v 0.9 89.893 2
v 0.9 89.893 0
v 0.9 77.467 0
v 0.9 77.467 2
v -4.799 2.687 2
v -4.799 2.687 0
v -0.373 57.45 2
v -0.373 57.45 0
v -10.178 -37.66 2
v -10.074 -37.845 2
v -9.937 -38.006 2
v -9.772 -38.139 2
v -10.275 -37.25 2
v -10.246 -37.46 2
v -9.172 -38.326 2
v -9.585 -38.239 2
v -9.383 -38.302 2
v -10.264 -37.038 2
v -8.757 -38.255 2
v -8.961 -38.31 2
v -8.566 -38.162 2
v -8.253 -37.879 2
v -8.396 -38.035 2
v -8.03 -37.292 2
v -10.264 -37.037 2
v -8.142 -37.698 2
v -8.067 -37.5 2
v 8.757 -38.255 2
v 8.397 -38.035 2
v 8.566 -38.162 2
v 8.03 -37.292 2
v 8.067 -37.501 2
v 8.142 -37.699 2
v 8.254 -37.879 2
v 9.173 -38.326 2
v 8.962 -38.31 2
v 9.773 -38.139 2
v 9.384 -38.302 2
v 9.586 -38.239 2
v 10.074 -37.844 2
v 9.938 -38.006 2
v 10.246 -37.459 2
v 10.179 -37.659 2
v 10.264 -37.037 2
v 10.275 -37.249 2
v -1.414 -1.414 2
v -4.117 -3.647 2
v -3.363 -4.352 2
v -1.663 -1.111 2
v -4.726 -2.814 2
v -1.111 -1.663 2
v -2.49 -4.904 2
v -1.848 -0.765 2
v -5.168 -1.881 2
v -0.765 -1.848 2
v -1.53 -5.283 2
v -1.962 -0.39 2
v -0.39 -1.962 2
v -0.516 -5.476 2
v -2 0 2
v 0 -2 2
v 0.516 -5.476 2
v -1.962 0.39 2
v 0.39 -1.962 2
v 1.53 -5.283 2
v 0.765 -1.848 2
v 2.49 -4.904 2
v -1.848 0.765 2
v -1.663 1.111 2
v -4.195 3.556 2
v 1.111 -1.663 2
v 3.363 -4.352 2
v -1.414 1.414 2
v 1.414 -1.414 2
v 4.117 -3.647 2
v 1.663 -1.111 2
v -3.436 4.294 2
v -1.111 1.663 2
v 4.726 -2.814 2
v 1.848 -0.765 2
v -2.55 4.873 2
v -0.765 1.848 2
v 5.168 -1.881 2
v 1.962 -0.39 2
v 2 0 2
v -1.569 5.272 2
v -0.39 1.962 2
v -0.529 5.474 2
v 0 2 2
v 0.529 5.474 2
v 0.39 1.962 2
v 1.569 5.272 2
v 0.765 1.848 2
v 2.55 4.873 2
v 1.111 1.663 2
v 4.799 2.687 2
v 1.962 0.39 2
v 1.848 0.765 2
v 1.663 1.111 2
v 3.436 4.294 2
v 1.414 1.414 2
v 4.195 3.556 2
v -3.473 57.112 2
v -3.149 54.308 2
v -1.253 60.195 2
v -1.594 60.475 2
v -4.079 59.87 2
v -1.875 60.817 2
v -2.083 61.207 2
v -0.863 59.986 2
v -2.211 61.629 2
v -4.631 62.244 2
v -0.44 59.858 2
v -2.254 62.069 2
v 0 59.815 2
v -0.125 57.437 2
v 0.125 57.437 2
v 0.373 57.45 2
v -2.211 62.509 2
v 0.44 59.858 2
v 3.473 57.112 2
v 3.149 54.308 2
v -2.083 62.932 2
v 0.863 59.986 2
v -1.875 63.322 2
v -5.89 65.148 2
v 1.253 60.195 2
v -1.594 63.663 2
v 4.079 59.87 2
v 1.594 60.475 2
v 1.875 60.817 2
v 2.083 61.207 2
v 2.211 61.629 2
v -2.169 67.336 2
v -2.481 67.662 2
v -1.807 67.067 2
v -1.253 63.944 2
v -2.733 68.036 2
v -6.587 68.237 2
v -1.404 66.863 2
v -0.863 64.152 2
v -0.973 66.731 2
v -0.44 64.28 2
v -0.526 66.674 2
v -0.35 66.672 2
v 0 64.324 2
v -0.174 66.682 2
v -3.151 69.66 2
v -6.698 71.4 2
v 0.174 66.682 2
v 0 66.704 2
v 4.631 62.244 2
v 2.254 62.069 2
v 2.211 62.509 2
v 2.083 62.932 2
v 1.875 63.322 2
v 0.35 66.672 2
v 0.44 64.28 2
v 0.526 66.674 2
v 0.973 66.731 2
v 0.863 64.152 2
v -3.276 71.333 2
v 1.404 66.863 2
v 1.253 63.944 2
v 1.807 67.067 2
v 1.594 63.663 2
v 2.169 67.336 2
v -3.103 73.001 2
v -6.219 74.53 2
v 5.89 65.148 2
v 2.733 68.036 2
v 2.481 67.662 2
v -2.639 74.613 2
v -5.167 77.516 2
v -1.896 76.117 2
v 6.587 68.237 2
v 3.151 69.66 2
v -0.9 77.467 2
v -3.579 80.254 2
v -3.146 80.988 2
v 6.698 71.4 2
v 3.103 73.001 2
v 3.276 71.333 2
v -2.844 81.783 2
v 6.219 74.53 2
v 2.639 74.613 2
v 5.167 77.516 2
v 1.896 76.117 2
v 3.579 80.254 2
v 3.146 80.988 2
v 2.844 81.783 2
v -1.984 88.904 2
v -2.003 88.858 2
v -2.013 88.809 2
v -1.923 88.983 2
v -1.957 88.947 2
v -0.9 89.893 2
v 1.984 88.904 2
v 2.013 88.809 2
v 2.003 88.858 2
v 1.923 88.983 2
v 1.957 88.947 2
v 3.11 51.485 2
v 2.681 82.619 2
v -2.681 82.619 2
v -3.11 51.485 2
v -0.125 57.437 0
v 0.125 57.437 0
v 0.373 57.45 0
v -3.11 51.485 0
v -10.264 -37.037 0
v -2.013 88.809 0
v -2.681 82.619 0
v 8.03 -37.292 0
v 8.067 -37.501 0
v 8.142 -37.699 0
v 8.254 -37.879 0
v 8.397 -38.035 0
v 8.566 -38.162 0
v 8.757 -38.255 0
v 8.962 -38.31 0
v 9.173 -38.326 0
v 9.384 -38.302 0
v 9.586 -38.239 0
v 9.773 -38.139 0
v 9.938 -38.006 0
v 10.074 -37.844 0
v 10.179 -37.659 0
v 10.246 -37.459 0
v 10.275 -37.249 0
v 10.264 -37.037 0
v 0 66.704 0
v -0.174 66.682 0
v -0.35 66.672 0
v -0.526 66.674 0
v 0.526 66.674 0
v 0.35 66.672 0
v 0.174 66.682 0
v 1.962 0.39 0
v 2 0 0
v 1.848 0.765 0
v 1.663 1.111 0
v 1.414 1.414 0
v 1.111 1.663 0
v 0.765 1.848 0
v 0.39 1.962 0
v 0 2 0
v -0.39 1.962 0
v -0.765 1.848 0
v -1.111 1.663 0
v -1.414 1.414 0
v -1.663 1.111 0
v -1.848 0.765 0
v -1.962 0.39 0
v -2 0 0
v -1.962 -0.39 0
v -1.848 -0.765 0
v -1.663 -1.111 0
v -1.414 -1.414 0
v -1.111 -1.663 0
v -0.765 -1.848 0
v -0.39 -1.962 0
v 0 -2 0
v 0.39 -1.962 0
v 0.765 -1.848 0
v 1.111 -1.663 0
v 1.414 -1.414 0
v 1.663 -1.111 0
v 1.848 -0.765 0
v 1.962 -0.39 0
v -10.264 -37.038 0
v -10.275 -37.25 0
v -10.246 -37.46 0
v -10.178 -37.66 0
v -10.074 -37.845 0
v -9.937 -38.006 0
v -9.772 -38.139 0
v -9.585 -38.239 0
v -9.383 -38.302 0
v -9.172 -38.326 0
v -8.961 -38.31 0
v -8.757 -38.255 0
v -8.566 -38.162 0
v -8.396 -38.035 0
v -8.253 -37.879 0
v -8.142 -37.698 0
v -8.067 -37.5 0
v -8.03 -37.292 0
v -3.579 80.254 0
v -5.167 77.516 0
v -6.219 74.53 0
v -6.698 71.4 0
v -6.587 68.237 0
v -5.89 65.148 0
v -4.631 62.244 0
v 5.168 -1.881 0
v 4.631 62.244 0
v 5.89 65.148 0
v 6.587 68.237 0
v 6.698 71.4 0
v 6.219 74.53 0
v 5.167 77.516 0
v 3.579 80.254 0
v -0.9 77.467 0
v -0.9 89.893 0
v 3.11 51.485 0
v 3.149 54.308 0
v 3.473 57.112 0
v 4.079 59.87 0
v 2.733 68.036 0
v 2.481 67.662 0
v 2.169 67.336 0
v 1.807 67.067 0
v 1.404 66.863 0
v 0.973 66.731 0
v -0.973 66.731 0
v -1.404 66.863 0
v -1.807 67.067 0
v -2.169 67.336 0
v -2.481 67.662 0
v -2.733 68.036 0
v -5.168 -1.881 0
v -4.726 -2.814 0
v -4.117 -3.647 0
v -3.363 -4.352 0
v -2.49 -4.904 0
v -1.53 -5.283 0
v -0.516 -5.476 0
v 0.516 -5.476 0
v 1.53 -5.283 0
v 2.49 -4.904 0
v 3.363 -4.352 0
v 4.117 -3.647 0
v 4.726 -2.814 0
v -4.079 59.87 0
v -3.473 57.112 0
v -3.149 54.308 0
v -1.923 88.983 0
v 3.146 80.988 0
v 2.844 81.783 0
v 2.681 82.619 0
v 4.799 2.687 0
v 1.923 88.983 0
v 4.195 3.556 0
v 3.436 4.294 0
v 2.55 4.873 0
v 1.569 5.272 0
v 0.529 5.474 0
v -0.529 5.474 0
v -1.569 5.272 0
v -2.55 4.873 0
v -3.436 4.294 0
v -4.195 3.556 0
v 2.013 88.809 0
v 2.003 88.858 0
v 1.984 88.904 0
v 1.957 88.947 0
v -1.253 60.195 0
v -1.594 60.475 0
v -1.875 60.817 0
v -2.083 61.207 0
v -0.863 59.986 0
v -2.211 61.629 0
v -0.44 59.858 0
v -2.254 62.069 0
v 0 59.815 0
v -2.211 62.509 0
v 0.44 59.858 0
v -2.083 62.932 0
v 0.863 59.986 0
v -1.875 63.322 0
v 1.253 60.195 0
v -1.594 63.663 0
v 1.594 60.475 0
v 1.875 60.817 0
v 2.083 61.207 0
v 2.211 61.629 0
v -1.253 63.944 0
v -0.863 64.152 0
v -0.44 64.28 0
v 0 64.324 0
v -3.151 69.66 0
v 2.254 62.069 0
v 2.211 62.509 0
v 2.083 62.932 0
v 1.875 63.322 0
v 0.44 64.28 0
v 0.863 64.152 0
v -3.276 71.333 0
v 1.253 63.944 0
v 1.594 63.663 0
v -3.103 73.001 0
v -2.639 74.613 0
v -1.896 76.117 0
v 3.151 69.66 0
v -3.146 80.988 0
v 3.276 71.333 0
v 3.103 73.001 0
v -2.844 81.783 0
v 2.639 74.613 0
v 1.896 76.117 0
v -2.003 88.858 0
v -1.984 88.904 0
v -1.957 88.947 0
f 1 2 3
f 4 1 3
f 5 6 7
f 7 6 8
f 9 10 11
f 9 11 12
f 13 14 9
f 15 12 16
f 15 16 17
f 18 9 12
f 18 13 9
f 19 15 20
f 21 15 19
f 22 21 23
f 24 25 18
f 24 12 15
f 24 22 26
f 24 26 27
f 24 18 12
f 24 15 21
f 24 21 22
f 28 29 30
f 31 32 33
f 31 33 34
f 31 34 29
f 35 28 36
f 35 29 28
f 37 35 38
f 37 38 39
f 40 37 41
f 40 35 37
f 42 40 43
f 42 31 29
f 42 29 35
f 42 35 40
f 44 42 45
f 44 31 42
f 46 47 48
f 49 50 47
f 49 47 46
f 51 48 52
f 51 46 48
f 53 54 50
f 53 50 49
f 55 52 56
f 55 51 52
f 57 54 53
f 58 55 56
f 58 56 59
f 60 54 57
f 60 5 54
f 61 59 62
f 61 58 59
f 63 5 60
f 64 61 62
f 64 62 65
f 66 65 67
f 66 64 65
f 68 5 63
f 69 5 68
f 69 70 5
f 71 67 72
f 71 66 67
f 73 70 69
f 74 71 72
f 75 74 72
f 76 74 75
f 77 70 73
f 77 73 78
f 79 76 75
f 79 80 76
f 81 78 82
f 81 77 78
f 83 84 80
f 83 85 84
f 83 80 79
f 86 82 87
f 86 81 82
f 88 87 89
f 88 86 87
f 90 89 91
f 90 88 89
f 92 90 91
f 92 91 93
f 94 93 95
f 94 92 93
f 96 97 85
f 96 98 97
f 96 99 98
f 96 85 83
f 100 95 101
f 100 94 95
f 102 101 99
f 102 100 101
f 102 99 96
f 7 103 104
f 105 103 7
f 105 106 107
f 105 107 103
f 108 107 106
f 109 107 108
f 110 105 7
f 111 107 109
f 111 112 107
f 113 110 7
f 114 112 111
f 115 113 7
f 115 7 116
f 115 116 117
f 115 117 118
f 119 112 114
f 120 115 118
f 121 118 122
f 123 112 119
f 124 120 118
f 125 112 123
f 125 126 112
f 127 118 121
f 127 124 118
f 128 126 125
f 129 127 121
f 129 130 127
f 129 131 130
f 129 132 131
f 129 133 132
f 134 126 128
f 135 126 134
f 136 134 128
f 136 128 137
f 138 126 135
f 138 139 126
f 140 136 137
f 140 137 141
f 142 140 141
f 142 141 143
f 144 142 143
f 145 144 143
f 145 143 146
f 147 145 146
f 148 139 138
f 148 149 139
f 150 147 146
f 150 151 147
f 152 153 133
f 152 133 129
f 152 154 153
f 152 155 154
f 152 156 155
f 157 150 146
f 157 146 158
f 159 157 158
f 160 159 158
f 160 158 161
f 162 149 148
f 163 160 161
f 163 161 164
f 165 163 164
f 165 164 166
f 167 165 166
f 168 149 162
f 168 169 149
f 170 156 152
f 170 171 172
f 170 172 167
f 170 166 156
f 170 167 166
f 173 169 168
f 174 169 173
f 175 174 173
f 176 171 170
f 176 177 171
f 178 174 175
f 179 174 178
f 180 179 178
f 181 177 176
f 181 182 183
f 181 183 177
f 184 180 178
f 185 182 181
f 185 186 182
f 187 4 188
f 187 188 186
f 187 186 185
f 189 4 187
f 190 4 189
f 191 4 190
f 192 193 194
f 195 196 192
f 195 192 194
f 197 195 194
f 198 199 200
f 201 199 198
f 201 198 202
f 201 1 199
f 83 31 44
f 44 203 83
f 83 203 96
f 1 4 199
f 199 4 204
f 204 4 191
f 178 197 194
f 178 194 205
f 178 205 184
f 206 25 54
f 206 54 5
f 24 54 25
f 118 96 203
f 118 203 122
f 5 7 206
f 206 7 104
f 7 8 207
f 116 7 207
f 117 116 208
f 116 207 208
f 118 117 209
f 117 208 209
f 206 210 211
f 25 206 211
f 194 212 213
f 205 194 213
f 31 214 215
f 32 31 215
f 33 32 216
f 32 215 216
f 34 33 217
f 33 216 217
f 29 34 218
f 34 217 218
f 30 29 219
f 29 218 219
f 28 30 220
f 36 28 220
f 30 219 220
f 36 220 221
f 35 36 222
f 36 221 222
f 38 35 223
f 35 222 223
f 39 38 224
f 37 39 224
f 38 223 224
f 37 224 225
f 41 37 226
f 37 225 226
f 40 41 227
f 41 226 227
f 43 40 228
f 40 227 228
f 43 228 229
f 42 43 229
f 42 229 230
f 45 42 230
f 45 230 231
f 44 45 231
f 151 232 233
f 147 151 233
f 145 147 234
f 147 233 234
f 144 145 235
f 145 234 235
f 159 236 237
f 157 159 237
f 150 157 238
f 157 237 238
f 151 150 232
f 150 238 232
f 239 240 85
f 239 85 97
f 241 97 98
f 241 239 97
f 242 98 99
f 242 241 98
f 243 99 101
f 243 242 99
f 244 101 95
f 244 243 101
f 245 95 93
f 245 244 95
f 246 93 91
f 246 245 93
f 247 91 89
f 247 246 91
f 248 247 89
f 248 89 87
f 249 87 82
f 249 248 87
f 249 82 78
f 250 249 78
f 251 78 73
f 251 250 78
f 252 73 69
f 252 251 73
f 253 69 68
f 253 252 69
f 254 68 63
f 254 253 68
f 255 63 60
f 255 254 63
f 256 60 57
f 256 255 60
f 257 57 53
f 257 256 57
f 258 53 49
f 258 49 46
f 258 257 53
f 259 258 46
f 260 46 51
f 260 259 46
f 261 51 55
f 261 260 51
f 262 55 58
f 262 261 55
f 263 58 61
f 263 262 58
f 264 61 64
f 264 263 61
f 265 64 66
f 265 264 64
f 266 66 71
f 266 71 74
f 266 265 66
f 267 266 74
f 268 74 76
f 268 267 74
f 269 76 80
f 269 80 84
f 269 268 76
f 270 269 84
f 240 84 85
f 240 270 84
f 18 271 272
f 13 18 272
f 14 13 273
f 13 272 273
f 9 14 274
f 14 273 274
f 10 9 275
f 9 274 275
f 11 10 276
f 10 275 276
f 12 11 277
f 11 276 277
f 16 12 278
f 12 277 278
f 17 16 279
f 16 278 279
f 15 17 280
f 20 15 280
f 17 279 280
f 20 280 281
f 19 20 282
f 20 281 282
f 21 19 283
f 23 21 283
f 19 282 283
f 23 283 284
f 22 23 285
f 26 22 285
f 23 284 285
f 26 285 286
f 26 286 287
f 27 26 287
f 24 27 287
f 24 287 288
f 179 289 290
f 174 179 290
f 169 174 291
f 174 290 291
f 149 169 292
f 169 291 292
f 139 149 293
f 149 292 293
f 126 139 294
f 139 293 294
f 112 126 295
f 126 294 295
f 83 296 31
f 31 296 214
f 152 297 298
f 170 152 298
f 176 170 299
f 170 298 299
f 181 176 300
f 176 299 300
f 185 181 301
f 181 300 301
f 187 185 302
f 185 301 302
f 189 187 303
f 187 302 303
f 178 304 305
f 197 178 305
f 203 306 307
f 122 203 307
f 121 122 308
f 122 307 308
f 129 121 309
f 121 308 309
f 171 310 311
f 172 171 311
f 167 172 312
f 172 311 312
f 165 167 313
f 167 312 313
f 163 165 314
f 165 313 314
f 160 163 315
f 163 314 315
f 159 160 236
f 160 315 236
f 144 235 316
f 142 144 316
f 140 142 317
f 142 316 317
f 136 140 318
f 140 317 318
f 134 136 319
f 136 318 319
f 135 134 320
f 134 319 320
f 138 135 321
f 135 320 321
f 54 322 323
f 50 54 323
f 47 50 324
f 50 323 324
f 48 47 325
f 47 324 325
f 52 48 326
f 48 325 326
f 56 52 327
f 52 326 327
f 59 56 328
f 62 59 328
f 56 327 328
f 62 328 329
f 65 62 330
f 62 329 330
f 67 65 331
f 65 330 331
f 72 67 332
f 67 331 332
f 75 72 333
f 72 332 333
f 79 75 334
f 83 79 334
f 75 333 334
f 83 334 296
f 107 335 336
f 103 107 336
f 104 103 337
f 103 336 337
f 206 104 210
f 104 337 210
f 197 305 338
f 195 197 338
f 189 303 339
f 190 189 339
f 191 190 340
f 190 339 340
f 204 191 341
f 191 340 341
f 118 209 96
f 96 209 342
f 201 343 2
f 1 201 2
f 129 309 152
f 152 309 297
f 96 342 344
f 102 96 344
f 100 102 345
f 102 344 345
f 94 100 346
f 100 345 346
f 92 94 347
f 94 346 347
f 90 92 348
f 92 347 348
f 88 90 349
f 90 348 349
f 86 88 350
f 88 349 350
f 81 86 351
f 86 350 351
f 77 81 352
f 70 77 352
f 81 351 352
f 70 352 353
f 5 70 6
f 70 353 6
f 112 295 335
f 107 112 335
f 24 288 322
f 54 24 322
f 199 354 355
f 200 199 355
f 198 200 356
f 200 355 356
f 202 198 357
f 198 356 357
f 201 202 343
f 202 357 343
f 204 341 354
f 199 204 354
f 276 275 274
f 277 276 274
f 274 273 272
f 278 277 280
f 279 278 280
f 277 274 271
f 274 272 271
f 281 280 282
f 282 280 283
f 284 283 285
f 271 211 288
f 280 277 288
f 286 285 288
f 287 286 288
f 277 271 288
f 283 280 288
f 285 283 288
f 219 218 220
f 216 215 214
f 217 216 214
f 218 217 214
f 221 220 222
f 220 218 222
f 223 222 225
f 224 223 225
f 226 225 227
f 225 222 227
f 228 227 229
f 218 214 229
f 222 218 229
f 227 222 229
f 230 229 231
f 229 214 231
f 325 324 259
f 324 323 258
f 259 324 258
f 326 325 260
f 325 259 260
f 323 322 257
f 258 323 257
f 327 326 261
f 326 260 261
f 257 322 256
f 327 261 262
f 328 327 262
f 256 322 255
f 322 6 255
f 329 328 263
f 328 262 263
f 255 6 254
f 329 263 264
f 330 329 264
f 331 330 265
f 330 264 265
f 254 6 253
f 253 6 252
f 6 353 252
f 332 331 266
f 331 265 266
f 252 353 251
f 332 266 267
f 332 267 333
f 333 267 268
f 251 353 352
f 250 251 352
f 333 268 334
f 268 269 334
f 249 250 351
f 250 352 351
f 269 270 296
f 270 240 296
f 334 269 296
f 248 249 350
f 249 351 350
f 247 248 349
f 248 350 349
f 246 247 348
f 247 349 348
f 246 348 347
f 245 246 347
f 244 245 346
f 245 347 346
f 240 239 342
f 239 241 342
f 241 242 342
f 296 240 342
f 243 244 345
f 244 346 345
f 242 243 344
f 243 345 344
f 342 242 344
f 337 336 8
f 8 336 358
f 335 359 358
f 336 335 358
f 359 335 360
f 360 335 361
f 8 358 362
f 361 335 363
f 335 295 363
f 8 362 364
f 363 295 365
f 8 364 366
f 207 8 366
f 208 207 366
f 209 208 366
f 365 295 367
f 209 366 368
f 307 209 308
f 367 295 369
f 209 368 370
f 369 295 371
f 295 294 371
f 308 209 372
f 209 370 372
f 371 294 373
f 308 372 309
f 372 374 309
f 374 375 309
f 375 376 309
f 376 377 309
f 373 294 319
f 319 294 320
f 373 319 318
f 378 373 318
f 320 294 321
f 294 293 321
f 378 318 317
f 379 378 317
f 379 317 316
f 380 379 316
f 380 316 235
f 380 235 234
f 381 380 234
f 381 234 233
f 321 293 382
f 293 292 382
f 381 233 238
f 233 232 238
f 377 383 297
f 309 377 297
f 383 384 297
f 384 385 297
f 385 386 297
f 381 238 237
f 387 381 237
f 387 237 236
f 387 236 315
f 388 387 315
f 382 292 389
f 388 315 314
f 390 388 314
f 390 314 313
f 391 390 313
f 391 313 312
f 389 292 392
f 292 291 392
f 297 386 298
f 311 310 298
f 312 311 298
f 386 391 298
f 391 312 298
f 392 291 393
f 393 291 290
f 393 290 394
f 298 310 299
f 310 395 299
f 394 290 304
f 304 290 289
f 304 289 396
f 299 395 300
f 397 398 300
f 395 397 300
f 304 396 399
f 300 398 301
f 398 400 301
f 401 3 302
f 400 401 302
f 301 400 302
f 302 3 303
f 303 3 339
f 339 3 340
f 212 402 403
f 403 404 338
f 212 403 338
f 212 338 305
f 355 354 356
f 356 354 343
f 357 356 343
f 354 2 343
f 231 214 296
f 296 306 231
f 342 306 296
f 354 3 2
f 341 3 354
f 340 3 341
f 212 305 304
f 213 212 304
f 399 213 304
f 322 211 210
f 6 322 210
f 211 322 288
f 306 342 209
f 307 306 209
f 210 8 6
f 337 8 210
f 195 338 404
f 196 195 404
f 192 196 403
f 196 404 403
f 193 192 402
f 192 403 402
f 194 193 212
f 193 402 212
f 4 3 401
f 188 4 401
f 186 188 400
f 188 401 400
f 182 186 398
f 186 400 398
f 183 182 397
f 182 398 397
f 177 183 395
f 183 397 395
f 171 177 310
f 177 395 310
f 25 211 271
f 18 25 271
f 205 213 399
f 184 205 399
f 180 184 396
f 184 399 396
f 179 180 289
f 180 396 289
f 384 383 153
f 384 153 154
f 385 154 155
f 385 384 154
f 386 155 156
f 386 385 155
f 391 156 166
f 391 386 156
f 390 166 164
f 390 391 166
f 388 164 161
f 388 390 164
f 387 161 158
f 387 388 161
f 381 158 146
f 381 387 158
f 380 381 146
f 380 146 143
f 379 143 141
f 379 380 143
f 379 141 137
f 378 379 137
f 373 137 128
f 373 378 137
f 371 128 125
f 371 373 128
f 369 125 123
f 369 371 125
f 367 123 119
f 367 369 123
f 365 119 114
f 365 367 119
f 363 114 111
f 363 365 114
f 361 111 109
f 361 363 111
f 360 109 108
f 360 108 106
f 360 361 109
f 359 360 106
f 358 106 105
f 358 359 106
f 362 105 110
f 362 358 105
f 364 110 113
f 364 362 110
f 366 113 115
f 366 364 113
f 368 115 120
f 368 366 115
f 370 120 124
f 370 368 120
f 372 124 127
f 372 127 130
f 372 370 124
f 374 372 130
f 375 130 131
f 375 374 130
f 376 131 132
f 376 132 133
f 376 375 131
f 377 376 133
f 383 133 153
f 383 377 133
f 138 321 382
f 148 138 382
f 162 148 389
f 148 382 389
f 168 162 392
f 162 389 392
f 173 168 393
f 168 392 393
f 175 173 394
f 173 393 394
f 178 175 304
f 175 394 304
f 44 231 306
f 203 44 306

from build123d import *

# Parameters (mm, degrees)
F0_R     = 2
F0_R_2   = 2.2544770367
F1_DEPTH = 2


# Not quite as in the source:
# - ends of sketch curves that miss each other by under 0.0002 mm in the source are joined


with BuildPart() as f1:
    # F0 (on Top) → F1 (new body)
    with BuildSketch(Plane.XY):
        with BuildLine():
            ThreePointArc((-5.1683257468, -1.8810659147), (0, -5.5), (5.1683257468, -1.8810659147))
            Line((5.1683257468, -1.8810659147), (8.0301481547, -37.2918741238))
            ThreePointArc((8.0301481547, -37.2918741238), (9.2788304803, -38.3188106152), (10.2640215975, -37.0369352038))
            Line((10.2640215975, -37.0369352038), (3.1098692343, 51.4850906656))
            ThreePointArc((3.1098692343, 51.4850906656), (3.2758505583, 55.7142948477), (4.0791085727, 59.8698326439))
            Line((4.0791085727, 59.8698326439), (4.6310273864, 62.2435739623))
            ThreePointArc((4.6310273864, 62.2435739623), (6.6977396132, 71.4003991777), (3.5793046773, 80.2544440729))
            ThreePointArc((3.5793046773, 80.2544440729), (2.9779070013, 81.3790562482), (2.6805769718, 82.6192282376))
            Line((2.6805769718, 82.6192282376), (2.0130627379, 88.8089160456))
            ThreePointArc((2.0130627379, 88.8089160456), (1.9844093078, 88.9043745509), (1.9233044553, 88.9831117232))
            Line((1.9233044553, 88.9831117232), (0.9, 89.8927152157))
            Line((0.9, 89.8927152157), (0.9, 77.4665676321))
            ThreePointArc((0.9, 77.4665676321), (3.1034376701, 73.0014155649), (2.7328648238, 68.0359955106))
            ThreePointArc((2.7328648238, 68.0359955106), (1.8069828059, 67.0668885057), (0.5256445201, 66.6736988627))
            ThreePointArc((0.5256445201, 66.6736988627), (0.2620789214, 66.6755874914), (0, 66.7036058899))
            ThreePointArc((0, 66.7036058899), (-0.2620789214, 66.6755874914), (-0.5256445201, 66.6736988627))
            ThreePointArc((-0.5256445201, 66.6736988627), (-1.8069828059, 67.0668885057), (-2.7328648238, 68.0359955106))
            ThreePointArc((-2.7328648238, 68.0359955106), (-3.1034376701, 73.0014155649), (-0.9, 77.4665676321))
            Line((-0.9, 77.4665676321), (-0.9, 89.8927152157))
            Line((-0.9, 89.8927152157), (-1.9233044553, 88.9831117232))
            ThreePointArc((-1.9233044553, 88.9831117232), (-1.9844093078, 88.9043745509), (-2.0130627379, 88.8089160456))
            Line((-2.0130627379, 88.8089160456), (-2.6805769718, 82.6192282376))
            ThreePointArc((-2.6805769718, 82.6192282376), (-2.9779070013, 81.3790562482), (-3.5793046773, 80.2544440729))
            ThreePointArc((-3.5793046773, 80.2544440729), (-6.6977396132, 71.4003991777), (-4.6310273864, 62.2435739623))
            Line((-4.6310273864, 62.2435739623), (-4.0791085727, 59.8698326439))
            ThreePointArc((-4.0791085727, 59.8698326439), (-3.2758505583, 55.7142948477), (-3.1098692343, 51.4850906656))
            Line((-3.1098692343, 51.4850906656), (-10.2640215975, -37.0369352038))
            Line((-10.2640215975, -37.0369352038), (-10.264126962, -37.0382389339))
            ThreePointArc((-10.264126962, -37.0382389339), (-9.2781820506, -38.3188844261), (-8.0301481547, -37.2918741238))
            Line((-8.0301481547, -37.2918741238), (-5.1683257468, -1.8810659147))
        make_face()
        Circle(F0_R, mode=Mode.SUBTRACT)
        with BuildLine():
            ThreePointArc((4.7991758084, 2.6866171219), (0, 5.5), (-4.7991758084, 2.6866171219))
            Line((-4.7991758084, 2.6866171219), (-0.3733170252, 57.4500560059))
            ThreePointArc((-0.3733170252, 57.4500560059), (0, 57.4349952343), (0.3733170252, 57.4500560059))
            Line((0.3733170252, 57.4500560059), (4.7991758084, 2.6866171219))
        make_face(mode=Mode.SUBTRACT)
        with Locations((0, 62.0693005621)):
            Circle(F0_R_2, mode=Mode.SUBTRACT)
    extrude(amount=F1_DEPTH)


solid = f1.part
